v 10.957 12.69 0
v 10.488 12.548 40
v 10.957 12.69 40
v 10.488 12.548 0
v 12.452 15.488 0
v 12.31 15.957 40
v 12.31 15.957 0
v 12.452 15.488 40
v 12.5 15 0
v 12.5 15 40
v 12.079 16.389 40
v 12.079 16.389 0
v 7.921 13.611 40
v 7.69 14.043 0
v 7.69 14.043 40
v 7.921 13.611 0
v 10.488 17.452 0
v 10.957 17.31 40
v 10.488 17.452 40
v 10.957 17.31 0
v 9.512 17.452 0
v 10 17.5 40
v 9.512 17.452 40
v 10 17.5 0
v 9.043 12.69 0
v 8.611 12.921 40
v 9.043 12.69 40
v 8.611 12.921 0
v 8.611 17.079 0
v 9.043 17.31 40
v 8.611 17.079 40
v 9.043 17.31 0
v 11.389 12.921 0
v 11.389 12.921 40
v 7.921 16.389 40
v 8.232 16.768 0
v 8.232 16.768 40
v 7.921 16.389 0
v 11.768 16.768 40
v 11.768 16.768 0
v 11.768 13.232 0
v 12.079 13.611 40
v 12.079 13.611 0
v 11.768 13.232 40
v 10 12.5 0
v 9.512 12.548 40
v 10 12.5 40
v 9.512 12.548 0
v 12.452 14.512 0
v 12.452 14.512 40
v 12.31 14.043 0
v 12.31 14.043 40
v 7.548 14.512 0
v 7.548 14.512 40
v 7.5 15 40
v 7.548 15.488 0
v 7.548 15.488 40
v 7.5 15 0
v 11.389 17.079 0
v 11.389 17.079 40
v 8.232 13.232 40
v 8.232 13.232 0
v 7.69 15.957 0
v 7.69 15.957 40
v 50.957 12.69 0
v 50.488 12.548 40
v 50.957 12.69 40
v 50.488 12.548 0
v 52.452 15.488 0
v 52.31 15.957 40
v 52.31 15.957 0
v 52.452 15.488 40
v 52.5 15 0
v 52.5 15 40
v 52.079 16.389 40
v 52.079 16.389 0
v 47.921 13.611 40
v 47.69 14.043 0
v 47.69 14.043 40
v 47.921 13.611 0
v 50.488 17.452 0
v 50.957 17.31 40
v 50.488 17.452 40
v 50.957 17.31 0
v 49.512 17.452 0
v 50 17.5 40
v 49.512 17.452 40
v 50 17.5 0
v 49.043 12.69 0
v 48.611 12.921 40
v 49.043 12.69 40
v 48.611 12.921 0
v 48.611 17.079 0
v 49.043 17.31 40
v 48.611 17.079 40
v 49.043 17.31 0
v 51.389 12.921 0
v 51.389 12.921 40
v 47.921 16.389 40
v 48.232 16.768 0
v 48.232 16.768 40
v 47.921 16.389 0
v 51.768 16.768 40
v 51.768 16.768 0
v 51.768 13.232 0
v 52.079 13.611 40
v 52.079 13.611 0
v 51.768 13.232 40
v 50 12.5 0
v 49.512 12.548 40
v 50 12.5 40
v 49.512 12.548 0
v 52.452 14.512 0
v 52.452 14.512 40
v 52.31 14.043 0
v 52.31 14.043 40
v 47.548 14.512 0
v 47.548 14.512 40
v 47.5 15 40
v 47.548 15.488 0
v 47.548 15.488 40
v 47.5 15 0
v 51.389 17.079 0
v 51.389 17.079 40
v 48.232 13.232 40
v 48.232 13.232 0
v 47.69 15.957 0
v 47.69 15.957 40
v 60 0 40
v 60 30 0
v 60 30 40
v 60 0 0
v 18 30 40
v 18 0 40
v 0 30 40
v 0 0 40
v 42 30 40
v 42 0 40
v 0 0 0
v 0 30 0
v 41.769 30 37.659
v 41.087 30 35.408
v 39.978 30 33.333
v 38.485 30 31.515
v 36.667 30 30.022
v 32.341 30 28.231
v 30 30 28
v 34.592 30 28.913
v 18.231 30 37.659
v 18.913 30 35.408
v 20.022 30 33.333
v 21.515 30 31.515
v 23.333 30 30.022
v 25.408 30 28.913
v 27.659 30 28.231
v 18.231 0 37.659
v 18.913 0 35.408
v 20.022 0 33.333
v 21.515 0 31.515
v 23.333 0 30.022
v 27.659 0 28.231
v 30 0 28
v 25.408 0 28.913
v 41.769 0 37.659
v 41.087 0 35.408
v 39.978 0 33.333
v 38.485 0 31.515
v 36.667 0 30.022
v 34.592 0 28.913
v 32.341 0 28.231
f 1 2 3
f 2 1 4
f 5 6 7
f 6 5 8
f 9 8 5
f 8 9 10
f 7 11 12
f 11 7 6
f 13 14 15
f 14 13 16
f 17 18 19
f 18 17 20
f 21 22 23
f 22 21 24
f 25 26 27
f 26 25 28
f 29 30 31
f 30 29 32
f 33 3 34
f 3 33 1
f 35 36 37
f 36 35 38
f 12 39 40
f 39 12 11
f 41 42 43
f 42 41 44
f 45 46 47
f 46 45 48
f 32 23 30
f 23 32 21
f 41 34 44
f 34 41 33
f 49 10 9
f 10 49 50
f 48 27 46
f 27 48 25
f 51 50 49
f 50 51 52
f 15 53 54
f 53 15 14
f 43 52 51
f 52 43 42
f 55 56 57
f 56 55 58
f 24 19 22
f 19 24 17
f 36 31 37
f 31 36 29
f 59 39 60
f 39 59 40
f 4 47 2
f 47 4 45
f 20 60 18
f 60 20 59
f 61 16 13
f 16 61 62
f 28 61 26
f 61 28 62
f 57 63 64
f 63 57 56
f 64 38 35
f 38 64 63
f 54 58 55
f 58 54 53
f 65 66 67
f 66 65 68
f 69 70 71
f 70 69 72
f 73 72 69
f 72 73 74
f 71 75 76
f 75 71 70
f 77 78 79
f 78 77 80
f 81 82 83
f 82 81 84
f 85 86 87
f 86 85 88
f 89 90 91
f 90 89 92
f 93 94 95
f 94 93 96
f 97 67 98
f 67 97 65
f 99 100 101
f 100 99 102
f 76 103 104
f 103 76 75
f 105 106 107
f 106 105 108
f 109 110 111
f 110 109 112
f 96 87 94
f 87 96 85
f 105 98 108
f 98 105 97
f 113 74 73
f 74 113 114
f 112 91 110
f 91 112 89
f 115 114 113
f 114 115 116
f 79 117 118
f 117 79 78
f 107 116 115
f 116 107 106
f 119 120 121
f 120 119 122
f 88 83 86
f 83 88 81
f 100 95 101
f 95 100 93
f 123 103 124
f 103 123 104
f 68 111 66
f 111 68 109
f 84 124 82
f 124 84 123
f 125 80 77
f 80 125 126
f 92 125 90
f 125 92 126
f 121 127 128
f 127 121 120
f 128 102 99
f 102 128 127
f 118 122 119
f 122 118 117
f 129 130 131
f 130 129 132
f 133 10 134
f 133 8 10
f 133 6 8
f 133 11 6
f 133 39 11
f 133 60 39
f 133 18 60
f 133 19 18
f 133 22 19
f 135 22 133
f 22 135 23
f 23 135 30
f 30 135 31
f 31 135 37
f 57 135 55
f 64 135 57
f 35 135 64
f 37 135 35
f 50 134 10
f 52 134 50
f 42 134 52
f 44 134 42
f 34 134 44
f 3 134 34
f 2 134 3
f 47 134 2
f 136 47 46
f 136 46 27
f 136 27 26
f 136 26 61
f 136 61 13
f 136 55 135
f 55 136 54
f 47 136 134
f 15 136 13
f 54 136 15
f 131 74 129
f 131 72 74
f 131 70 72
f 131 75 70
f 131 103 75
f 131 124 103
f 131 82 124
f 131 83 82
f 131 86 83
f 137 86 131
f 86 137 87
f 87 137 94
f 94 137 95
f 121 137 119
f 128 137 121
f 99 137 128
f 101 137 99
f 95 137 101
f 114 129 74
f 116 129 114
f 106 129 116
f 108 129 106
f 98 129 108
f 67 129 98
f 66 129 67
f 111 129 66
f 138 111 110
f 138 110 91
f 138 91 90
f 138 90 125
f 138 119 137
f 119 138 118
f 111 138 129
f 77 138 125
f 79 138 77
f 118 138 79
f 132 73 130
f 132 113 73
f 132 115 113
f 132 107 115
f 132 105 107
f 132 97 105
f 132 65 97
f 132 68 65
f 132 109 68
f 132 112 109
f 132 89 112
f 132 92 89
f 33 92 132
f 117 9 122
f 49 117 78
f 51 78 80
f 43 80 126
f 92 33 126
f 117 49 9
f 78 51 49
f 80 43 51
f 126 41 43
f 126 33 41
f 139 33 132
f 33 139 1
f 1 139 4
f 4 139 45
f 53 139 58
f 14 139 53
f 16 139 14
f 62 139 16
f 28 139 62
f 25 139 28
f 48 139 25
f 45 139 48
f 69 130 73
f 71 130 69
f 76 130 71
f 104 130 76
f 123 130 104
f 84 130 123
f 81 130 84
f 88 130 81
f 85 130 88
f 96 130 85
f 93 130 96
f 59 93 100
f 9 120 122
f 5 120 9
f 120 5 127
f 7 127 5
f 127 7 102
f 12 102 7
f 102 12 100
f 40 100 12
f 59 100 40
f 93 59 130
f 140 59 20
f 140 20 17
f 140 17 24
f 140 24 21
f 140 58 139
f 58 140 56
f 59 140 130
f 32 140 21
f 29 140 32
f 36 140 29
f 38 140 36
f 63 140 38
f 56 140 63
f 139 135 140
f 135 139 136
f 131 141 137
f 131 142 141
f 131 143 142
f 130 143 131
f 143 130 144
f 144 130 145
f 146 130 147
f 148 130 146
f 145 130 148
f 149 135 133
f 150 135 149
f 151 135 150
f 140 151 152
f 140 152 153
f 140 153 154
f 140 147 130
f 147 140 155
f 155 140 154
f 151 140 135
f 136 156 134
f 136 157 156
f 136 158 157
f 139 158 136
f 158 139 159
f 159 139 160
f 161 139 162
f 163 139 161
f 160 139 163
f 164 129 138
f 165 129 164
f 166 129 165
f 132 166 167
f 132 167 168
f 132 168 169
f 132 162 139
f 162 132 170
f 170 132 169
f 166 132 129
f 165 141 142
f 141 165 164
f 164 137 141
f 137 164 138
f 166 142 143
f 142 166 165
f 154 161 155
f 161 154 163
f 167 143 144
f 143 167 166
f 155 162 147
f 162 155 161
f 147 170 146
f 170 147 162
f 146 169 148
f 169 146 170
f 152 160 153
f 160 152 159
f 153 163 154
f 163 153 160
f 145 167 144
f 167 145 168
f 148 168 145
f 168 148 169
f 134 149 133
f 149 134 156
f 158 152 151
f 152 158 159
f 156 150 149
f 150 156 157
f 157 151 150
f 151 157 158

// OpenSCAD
$fn = 32;

// ----------------------------------------------------------------------
// Saddle clamp: plain shaft clamp
// ----------------------------------------------------------------------

// --- parameters (mm) ---
blk_l = 60;               // block length, X
blk_w = 30;               // block width, Y
blk_h = 40;               // block height
clamp_r = 12;             // shaft groove radius
hole_r = 2.5;             // bolt hole radius
hole_m = 10;              // bolt hole margin from the ends

saw_depth = clamp_r + 3;  // saw kerf depth

difference() {
  cube([blk_l, blk_w, blk_h]);
  translate([blk_l / 2, -1, blk_h])
    rotate([-90, 0, 0])
      cylinder(h = blk_w + 2, r = clamp_r);
  for (sx = [0, 1])
    translate([sx ? blk_l - hole_m : hole_m, blk_w / 2, -1])
      cylinder(r = hole_r, h = blk_h + 2);
}
